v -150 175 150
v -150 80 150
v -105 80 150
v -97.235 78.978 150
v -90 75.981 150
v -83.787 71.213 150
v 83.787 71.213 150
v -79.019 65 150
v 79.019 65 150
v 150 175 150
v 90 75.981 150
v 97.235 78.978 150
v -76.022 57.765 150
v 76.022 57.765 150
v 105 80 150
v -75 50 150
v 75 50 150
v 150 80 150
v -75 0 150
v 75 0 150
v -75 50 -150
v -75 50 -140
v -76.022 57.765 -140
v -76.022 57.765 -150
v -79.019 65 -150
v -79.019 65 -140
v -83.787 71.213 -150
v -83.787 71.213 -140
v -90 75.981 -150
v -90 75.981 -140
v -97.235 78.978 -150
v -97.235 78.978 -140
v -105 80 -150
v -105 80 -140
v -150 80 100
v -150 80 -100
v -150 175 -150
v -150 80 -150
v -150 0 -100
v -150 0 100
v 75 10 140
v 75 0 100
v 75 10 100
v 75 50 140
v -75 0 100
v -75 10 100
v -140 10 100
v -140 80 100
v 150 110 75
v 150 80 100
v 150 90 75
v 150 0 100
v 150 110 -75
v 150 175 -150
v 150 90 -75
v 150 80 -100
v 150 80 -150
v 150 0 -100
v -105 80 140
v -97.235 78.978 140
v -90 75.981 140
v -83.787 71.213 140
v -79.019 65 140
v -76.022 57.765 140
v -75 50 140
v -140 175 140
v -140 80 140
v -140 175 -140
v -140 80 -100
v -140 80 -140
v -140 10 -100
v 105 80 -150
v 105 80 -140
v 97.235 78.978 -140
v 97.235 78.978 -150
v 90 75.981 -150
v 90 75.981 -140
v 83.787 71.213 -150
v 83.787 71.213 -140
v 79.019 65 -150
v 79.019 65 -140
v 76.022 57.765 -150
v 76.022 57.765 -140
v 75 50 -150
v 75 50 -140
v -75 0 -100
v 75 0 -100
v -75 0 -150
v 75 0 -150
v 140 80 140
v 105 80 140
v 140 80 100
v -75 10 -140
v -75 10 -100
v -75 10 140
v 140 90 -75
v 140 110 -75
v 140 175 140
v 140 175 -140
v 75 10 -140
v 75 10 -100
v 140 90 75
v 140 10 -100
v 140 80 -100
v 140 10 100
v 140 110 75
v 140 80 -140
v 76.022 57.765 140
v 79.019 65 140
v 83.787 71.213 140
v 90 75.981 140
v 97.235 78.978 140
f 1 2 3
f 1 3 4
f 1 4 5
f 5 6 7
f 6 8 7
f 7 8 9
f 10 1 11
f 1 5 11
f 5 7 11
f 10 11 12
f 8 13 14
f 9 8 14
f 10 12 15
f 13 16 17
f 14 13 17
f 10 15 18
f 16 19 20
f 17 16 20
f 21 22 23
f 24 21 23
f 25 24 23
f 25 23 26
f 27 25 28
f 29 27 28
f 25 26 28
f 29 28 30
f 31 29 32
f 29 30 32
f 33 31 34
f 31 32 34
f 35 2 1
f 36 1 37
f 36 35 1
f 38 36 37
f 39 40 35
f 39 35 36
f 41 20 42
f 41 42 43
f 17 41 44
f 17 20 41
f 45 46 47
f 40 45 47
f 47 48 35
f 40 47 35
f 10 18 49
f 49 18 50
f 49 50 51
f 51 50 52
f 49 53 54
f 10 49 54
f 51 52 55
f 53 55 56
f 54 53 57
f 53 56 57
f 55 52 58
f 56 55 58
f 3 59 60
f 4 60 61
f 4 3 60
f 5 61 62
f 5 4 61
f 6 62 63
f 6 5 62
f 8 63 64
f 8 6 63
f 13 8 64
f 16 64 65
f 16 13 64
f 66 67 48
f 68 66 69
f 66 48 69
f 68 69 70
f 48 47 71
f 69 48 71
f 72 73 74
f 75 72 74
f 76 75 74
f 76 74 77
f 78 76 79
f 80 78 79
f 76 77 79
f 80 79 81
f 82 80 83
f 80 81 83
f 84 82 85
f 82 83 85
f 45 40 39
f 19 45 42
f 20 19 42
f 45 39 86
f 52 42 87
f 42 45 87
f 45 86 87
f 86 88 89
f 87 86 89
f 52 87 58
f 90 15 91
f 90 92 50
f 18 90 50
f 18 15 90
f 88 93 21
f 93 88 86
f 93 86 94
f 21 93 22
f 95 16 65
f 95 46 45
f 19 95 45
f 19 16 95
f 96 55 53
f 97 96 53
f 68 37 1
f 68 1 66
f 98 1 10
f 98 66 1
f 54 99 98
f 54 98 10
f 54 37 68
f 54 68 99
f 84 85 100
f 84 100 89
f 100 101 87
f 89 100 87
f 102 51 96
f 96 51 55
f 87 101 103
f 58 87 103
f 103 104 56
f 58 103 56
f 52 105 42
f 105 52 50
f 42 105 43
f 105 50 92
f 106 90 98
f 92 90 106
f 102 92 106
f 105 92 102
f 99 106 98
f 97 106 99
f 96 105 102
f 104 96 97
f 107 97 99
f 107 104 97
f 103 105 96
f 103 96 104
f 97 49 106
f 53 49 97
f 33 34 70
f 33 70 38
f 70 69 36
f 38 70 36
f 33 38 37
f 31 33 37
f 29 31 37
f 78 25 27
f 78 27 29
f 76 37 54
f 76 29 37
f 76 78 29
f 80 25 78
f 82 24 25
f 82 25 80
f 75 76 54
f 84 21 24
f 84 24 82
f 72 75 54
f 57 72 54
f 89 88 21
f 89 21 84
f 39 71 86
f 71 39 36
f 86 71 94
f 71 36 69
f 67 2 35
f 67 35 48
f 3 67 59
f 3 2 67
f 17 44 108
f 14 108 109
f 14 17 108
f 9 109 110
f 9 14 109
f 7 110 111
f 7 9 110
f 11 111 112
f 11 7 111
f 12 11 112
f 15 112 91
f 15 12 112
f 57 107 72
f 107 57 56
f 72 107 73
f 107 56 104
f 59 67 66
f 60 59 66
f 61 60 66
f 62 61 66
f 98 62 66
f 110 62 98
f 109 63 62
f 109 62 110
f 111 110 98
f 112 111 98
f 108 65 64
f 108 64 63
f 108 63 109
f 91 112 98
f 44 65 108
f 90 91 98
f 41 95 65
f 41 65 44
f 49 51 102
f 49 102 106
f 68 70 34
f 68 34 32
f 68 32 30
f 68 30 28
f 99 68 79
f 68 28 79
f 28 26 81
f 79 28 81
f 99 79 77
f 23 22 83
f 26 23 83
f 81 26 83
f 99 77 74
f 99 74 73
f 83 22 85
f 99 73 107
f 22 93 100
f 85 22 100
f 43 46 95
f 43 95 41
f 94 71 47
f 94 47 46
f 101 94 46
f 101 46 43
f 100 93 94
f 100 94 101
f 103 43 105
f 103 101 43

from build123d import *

# Parameters (mm, degrees)
SKETCH1_W                      = 300
SKETCH1_H                      = 300
BOSS_EXTRUDE1_DEPTH            = 175
SHELL1_T                       = -10
CUT_EXTRUDE5_DEPTH             = 50
CUT_EXTRUDE6_START             = -50
CUT_EXTRUDE6_DEPTH             = 50
CUT_EXTRUDE7_REACH             = 380.319
SKETCH8_W                      = 150
SKETCH8_H                      = 20
CUT_EXTRUDE7_DIRECTION_2_DEPTH = 379.318648761


with BuildPart() as part:
    # Sketch1 → Boss-Extrude1 (new body)
    with BuildSketch(Plane(origin=(0, 0, 0), x_dir=(1, 0, 0), z_dir=(0, 1, 0))):
        Rectangle(SKETCH1_W, SKETCH1_H)
    extrude(amount=BOSS_EXTRUDE1_DEPTH)

    # Shell1
    shell1_openings = [part.faces().sort_by_distance(p)[0] for p in [
        (0, 175, 0),
    ]]
    offset(amount=SHELL1_T, openings=shell1_openings, kind=Kind.INTERSECTION)

    # Sketch4 → Cut-Extrude5 (cut)
    with BuildSketch(Plane.XY.offset(150)):
        with BuildLine():
            Line((0, 0), (75, 0))
            Line((75, 0), (75, 50))
            ThreePointArc((75, 50), (83.786796564, 71.213203436), (105, 80))
            Line((105, 80), (150, 80))
            Line((150, 80), (150, -5))
            Line((150, -5), (-150, -5))
            Line((-150, -5), (-150, 80))
            Line((-150, 80), (-105, 80))
            ThreePointArc((-105, 80), (-83.786796564, 71.213203436), (-75, 50))
            Line((-75, 50), (-75, 0))
            Line((-75, 0), (0, 0))
        make_face()
    extrude(amount=-CUT_EXTRUDE5_DEPTH, mode=Mode.SUBTRACT)

    # Sketch7 → Cut-Extrude6 (cut)
    with BuildSketch(Plane(origin=(0, 0, -150), x_dir=(-1, 0, 0), z_dir=(0, 0, -1)).offset(CUT_EXTRUDE6_START)):
        with BuildLine():
            Line((0, 0), (75, 0))
            Line((75, 0), (75, 50))
            ThreePointArc((75, 50), (83.786796564, 71.213203436), (105, 80))
            Line((105, 80), (150, 80))
            Line((150, 80), (150, -5))
            Line((150, -5), (-150, -5))
            Line((-150, -5), (-150, 80))
            Line((-150, 80), (-105, 80))
            ThreePointArc((-105, 80), (-83.786796564, 71.213203436), (-75, 50))
            Line((-75, 50), (-75, 0))
            Line((-75, 0), (0, 0))
        make_face()
    extrude(amount=CUT_EXTRUDE6_DEPTH, mode=Mode.SUBTRACT)

    # Sketch8 → Cut-Extrude7 (cut, up to next)
    with BuildSketch(Plane(origin=(150, 0, 0), x_dir=(0, 0, -1), z_dir=(1, 0, 0)), mode=Mode.PRIVATE) as cut_extrude7_sk1:
        with Locations((0, 100)):
            Rectangle(SKETCH8_W, SKETCH8_H)
    cut_extrude7_tool1 = extrude(cut_extrude7_sk1.sketch, amount=-CUT_EXTRUDE7_REACH, mode=Mode.PRIVATE) & part.part
    add(cut_extrude7_tool1.solids().sort_by_distance((150, 100, 0))[0], mode=Mode.SUBTRACT)

    # Sketch8 → Cut-Extrude7 direction 2 (cut)
    with BuildSketch(Plane(origin=(150, 0, 0), x_dir=(0, 0, -1), z_dir=(1, 0, 0))):
        with Locations((0, 100)):
            Rectangle(SKETCH8_W, SKETCH8_H)
    extrude(amount=CUT_EXTRUDE7_DIRECTION_2_DEPTH, mode=Mode.SUBTRACT)


solid = part.part
